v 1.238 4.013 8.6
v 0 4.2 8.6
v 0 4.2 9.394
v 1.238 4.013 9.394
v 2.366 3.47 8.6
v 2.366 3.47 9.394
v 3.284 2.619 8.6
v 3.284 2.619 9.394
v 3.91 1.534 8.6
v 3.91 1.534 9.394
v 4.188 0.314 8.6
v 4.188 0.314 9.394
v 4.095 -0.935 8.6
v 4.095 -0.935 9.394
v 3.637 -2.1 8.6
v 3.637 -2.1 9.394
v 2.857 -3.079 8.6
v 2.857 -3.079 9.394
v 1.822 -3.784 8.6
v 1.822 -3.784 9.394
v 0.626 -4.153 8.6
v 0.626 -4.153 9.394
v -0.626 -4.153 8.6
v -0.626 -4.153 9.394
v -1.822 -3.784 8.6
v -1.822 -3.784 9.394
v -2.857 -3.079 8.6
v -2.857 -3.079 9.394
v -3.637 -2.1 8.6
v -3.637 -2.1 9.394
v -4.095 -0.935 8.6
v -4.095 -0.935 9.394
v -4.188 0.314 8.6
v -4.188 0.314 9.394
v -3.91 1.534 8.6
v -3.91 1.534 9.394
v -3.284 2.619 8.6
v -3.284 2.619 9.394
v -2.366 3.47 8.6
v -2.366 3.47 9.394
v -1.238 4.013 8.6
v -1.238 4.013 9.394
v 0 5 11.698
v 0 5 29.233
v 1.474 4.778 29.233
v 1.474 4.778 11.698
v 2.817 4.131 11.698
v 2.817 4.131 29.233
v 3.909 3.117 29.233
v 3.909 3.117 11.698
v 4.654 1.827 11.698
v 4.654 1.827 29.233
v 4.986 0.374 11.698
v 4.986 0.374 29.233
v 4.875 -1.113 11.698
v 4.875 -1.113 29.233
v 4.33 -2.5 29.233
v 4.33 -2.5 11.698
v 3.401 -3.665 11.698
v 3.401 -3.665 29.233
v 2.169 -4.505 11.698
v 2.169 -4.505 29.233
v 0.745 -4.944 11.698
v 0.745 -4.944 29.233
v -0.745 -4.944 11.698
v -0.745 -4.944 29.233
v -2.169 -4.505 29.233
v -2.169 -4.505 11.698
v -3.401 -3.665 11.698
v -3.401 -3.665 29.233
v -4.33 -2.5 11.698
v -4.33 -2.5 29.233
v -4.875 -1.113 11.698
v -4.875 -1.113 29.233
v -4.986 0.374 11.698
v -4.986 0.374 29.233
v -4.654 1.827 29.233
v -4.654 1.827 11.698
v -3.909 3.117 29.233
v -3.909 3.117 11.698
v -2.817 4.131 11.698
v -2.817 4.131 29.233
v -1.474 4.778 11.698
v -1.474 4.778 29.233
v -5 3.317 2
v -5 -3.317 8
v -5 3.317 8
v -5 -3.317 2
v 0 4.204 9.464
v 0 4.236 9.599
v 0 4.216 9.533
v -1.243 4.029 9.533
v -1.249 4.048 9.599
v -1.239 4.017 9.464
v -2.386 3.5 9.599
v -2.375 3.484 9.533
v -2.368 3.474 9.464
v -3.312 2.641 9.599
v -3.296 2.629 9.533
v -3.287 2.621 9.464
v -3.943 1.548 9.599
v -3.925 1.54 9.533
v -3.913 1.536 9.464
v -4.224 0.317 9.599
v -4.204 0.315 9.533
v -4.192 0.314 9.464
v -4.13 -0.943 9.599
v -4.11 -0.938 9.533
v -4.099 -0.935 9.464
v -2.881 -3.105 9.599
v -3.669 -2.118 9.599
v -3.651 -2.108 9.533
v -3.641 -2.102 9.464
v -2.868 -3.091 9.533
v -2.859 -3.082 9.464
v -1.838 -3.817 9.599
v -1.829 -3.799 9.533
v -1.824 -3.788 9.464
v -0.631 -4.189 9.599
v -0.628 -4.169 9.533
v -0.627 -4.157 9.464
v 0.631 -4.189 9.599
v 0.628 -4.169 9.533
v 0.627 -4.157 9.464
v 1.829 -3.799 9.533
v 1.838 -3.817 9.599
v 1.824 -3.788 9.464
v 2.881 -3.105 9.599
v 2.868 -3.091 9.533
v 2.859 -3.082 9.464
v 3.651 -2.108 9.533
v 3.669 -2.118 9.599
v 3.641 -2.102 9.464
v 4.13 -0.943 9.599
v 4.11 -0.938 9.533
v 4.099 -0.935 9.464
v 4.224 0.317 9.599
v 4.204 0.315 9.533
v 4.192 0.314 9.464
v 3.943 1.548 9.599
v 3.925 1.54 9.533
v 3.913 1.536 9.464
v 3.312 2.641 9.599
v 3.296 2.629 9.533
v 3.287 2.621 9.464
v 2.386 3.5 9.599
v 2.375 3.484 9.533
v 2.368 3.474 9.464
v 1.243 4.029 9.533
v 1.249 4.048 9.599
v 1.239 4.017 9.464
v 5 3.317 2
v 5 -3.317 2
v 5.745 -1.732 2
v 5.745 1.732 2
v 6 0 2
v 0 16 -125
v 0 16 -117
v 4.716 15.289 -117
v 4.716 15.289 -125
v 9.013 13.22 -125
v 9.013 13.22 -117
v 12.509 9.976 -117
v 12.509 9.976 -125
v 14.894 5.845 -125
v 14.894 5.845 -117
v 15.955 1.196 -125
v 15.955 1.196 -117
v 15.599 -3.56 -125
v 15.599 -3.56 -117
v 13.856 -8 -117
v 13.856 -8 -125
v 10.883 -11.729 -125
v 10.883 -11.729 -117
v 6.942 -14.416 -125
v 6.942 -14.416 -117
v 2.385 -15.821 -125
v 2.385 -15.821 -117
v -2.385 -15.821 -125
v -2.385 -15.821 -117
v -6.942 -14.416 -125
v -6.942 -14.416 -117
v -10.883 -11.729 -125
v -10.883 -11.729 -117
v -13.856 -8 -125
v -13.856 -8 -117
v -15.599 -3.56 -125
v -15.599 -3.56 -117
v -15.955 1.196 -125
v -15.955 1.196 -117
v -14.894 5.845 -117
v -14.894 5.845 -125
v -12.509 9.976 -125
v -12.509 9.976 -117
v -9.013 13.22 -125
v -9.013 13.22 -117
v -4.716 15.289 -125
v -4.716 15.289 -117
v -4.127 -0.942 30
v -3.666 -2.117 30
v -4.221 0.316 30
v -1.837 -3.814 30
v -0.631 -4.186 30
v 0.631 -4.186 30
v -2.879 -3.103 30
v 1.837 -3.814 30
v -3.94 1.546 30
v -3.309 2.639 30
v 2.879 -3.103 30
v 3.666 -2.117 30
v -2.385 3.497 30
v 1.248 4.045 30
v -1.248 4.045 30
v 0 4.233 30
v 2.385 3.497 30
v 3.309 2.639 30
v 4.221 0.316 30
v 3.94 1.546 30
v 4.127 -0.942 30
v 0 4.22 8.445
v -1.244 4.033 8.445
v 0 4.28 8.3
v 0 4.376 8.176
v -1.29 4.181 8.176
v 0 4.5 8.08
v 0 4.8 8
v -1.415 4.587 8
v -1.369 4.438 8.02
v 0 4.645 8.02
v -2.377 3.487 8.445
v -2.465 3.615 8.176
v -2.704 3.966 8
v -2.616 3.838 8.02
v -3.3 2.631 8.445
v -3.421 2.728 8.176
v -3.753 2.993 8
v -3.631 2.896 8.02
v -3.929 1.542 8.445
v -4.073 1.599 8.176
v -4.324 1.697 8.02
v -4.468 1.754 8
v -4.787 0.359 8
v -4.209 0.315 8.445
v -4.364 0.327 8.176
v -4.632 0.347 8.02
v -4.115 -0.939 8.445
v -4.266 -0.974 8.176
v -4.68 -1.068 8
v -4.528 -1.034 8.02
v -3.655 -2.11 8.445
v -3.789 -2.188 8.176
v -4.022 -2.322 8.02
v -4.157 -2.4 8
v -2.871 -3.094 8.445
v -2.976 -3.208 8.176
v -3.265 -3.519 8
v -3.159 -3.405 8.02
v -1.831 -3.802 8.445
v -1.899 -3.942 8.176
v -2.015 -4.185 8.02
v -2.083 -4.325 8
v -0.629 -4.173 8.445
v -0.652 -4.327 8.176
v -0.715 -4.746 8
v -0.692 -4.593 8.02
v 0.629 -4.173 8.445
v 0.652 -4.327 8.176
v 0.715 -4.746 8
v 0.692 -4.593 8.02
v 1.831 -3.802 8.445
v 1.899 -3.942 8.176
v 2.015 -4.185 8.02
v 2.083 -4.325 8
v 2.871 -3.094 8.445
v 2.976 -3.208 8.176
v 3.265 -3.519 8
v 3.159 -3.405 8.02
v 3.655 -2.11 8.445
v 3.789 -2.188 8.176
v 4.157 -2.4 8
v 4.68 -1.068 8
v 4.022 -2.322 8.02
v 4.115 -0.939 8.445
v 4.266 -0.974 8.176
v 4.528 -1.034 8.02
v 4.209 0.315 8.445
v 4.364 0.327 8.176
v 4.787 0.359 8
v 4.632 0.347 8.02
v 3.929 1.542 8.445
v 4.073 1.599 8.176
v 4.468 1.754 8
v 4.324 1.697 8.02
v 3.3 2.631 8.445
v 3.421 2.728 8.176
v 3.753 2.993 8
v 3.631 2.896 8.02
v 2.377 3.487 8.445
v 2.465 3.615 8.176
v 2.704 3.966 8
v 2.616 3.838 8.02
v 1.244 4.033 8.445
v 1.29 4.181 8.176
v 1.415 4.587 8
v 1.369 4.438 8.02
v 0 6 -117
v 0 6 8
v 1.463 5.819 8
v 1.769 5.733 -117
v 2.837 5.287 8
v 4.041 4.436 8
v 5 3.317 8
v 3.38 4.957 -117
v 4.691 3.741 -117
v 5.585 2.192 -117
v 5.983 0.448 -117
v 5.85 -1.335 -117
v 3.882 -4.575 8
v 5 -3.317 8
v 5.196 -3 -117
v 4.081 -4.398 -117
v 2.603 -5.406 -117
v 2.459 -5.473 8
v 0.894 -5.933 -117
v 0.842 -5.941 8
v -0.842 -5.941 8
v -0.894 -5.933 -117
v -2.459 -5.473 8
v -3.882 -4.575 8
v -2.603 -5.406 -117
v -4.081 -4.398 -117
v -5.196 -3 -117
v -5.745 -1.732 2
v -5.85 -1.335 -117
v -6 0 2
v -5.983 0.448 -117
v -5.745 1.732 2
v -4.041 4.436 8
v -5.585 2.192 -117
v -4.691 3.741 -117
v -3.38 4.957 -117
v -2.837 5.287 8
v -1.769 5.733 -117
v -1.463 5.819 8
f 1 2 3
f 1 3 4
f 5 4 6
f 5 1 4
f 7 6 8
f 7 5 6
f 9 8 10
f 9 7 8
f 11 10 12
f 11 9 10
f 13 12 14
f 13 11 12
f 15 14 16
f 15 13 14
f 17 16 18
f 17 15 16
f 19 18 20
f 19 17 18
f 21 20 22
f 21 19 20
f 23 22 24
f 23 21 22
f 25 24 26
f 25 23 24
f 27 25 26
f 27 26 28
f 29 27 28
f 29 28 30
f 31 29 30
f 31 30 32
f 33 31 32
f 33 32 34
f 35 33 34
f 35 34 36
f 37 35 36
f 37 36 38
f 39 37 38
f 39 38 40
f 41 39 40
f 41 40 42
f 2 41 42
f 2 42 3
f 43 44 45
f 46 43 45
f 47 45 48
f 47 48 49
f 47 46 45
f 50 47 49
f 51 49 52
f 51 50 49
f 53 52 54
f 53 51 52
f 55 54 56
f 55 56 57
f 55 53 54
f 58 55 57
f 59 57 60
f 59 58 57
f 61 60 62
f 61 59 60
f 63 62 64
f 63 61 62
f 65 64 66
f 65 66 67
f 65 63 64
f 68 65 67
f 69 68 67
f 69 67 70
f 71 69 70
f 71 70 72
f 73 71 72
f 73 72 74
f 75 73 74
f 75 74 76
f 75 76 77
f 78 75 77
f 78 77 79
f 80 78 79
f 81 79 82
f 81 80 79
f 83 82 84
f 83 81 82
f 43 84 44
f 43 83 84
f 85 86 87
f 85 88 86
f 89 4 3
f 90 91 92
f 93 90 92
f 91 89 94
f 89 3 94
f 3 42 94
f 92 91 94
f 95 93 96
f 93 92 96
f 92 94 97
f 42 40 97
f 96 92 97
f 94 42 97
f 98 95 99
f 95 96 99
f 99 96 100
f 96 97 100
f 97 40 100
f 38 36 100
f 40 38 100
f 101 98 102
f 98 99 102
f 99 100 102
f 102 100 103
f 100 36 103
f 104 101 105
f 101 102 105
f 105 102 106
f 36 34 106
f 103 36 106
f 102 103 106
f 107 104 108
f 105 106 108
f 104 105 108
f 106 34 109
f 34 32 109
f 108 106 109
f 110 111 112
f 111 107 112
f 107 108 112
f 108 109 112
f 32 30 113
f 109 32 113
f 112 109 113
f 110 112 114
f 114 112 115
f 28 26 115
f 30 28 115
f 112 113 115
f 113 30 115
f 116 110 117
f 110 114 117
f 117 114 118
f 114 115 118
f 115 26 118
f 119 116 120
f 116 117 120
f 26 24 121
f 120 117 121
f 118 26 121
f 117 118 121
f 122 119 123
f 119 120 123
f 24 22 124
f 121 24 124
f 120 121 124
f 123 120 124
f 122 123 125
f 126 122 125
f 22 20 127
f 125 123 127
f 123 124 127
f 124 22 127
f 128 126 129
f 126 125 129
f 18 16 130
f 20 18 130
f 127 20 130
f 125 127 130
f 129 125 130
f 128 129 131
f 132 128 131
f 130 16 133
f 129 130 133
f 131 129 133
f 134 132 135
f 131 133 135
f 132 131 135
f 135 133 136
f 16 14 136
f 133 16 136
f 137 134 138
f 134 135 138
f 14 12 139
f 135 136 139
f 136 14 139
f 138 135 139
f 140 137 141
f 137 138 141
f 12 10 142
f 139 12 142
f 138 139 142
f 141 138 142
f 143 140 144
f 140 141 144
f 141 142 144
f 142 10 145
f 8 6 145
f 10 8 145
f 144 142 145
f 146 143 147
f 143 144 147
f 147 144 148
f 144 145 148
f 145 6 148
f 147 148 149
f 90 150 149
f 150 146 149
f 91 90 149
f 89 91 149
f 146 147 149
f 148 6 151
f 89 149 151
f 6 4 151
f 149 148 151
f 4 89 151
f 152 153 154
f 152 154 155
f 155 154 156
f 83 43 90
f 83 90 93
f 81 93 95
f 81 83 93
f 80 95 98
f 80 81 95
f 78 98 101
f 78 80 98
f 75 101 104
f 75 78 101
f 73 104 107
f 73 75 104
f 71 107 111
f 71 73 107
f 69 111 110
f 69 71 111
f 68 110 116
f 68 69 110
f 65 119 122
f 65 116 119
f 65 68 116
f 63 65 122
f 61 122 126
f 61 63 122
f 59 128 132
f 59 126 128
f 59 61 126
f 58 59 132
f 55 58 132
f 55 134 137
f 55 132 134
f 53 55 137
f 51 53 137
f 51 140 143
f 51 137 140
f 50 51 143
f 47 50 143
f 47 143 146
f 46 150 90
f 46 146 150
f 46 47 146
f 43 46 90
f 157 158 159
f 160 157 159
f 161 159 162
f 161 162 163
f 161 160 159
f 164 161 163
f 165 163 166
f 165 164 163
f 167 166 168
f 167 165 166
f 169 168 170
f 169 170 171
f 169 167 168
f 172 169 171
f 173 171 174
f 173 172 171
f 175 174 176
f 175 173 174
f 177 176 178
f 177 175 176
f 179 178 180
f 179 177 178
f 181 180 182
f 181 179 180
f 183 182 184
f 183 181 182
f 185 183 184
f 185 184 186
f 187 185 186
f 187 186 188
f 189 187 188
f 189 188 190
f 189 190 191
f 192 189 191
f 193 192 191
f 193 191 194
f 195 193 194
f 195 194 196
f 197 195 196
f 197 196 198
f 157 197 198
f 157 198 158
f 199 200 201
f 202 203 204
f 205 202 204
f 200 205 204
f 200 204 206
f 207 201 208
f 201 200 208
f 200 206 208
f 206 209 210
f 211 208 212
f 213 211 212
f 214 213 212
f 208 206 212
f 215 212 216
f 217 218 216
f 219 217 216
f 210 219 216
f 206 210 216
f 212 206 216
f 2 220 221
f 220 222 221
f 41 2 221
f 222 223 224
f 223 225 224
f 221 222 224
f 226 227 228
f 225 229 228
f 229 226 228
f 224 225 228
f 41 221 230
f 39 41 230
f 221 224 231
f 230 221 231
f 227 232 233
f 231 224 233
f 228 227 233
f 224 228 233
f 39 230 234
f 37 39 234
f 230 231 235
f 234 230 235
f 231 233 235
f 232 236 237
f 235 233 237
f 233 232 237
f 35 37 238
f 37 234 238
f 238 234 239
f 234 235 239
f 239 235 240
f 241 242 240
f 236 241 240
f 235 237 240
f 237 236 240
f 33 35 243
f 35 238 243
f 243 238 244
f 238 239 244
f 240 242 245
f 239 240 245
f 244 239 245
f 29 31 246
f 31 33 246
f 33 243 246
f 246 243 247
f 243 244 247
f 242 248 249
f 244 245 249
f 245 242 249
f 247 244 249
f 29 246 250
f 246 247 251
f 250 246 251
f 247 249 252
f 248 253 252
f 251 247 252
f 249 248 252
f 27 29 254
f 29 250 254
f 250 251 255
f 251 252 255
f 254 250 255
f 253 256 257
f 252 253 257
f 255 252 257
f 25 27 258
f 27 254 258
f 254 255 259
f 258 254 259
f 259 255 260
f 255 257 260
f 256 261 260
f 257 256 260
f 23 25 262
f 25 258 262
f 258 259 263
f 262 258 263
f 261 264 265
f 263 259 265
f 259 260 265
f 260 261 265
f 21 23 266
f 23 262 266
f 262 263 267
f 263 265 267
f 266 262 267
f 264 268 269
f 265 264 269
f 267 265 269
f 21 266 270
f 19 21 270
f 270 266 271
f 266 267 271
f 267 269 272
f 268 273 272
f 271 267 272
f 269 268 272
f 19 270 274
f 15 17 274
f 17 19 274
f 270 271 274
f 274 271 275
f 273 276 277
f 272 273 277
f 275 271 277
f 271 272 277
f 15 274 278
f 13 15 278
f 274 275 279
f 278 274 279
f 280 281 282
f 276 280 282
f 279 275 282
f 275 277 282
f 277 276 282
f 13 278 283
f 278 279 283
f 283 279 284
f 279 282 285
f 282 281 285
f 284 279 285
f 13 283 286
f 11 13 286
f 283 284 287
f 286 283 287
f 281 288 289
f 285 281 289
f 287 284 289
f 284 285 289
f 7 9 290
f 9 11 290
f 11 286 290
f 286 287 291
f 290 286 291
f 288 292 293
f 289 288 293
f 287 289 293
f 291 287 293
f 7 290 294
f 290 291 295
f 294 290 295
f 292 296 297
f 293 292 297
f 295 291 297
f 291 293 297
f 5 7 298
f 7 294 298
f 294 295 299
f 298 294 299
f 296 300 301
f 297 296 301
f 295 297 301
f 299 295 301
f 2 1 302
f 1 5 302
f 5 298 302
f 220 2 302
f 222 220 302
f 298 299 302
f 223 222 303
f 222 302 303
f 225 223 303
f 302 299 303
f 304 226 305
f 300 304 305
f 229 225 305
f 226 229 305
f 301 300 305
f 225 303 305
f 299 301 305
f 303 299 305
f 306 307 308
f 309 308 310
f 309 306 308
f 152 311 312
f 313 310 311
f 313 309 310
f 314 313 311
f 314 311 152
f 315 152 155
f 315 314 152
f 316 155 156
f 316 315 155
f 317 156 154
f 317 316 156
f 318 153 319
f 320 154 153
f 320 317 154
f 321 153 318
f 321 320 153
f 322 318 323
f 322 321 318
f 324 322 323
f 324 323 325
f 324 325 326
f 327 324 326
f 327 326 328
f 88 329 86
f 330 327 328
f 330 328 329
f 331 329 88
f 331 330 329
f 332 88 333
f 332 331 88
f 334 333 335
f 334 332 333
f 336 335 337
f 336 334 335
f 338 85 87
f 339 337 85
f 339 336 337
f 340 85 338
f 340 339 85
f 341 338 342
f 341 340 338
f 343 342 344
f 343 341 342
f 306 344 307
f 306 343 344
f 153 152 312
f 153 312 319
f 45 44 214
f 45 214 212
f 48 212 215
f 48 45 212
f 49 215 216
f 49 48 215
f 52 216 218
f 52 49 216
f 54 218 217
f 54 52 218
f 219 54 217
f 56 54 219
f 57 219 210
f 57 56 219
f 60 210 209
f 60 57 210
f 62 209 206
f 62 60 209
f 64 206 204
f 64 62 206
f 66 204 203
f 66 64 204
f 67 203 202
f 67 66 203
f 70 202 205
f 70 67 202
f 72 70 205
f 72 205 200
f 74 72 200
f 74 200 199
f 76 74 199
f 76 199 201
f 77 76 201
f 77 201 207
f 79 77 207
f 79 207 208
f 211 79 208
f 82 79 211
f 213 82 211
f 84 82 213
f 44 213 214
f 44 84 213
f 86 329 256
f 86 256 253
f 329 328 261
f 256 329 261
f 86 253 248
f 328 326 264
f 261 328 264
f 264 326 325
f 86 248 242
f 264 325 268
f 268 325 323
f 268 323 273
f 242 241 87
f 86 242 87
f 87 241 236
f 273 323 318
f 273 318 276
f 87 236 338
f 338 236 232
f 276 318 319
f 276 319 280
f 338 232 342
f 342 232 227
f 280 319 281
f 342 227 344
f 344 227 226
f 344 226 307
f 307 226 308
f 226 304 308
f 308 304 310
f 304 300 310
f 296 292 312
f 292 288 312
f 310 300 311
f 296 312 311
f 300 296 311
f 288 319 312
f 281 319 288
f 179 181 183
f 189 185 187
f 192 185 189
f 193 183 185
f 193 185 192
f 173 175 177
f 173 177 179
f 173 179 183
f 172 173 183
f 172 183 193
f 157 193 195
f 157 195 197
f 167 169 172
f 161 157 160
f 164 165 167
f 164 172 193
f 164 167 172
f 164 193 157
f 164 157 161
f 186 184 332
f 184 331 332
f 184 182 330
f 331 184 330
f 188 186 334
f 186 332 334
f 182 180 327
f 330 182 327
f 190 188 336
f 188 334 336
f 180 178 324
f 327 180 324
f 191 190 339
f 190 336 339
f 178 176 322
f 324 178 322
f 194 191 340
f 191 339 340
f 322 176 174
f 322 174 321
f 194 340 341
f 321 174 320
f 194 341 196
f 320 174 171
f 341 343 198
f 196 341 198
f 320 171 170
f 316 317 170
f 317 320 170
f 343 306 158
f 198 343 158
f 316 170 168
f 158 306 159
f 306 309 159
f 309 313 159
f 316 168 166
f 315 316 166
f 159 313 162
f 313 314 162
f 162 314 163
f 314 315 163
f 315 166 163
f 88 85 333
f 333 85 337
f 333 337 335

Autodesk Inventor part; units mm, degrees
sketch "Sketch_2" plane through (0, 0, 0) normal (1, 0, 0) x (0, 1, 0)
  line L0 (0, -125) -> (0, 8)
  line L1 (0, 8) -> (6, 8)
  line L2 (6, 8) -> (6, -117)
  line L3 (6, -117) -> (16, -117)
  line L4 (16, -117) -> (16, -125)
  line L5 (16, -125) -> (0, -125)
  line L6 (0, -125) -> (0, 8)
revolve "Revolution1" add sketch "Sketch_2" angle 360 about axis through (0, 0, -125) along (0, 0, -1)
sketch "Sketch_6" plane through (0, 0, 0) normal (1, 0, 0) x (0, 1, 0)
  line L0 (0, 7) -> (0, 30)
  line L1 (0, 30) -> (4.233, 30)
  line L2 (4.233, 30) -> (5, 29.233)
  line L3 (5, 29.233) -> (5, 11.698)
  line L4 (5, 11.698) -> (4.2362, 9.5994)
  arc A0 (4.2362, 9.5994) -> (4.2, 9.3942) centre (4.8, 9.3942) ccw
  line L5 (4.2, 9.3942) -> (4.2, 8.6)
  arc A1 (4.2, 8.6) -> (4.8, 8) centre (4.8, 8.6) ccw
  line L6 (4.8, 8) -> (5, 8)
  line L7 (5, 8) -> (5, 7)
  line L8 (5, 7) -> (0, 7)
  line L9 (0, 7) -> (0, 30)
revolve "Revolution2" add sketch "Sketch_6" angle 360 about axis through (0, 0, 7) along (0, 0, -1)
thread "Thread1" size "M10x1.25" class "6g" standard "ISO Metric profile" full length
sketch "Sketch_7" plane through (0, 0, 2) normal (0, 0, 1) x (1, 0, 0)
  line L0 (-10, 20) -> (-10, -10)
  line L1 (-10, -10) -> (-5, -10)
  line L2 (-5, -10) -> (-5, 10)
  line L3 (-5, 10) -> (5, 10)
  line L4 (5, 10) -> (5, -10)
  line L5 (5, -10) -> (10, -10)
  line L6 (10, -10) -> (10, 20)
  line L7 (10, 20) -> (-10, 20)
extrude "Extrusion1" cut sketch "Sketch_7" along normal blind 7
ref_plane "FDT_KSAUFSATZ_XY" through (0, 0, 17) normal (0, 0, 1) x (-1, 0, 0)
ref_plane "FDT_KSAUFSATZ_YZ" through (0, 0, 17) normal (-1, 0, 0) x (0, -1, 0)
ref_plane "FDT_KSAUFSATZ_ZX" through (0, 0, 17) normal (0, -1, 0) x (0, 0, 1)
ref_plane "FDT_NUT_XY" through (0, 0, 17) normal (0, 0, 1) x (-1, 0, 0)
ref_plane "FDT_NUT_YZ" through (0, 0, 17) normal (-1, 0, 0) x (0, -1, 0)
ref_plane "FDT_NUT_ZX" through (0, 0, 17) normal (0, -1, 0) x (0, 0, 1)
ref_plane "KS_XY" through (0, 0, 0) normal (0, 0, -1) x (1, 0, 0)
ref_plane "KS_YZ" through (0, 0, 0) normal (1, 0, 0) x (0, -1, 0)
ref_plane "KS_ZX" through (0, 0, 0) normal (0, -1, 0) x (0, 0, -1)
ref_plane "NUT1_XY" through (0, 0, 22) normal (0, 0, 1) x (1, 0, 0)
ref_plane "NUT1_YZ" through (0, 0, 22) normal (1, 0, 0) x (0, 1, 0)
ref_plane "NUT1_ZX" through (0, 0, 22) normal (0, 1, 0) x (0, 0, 1)
properties part number "193992 DSNU-32-60-PPS---(A---00--0-KS)"
